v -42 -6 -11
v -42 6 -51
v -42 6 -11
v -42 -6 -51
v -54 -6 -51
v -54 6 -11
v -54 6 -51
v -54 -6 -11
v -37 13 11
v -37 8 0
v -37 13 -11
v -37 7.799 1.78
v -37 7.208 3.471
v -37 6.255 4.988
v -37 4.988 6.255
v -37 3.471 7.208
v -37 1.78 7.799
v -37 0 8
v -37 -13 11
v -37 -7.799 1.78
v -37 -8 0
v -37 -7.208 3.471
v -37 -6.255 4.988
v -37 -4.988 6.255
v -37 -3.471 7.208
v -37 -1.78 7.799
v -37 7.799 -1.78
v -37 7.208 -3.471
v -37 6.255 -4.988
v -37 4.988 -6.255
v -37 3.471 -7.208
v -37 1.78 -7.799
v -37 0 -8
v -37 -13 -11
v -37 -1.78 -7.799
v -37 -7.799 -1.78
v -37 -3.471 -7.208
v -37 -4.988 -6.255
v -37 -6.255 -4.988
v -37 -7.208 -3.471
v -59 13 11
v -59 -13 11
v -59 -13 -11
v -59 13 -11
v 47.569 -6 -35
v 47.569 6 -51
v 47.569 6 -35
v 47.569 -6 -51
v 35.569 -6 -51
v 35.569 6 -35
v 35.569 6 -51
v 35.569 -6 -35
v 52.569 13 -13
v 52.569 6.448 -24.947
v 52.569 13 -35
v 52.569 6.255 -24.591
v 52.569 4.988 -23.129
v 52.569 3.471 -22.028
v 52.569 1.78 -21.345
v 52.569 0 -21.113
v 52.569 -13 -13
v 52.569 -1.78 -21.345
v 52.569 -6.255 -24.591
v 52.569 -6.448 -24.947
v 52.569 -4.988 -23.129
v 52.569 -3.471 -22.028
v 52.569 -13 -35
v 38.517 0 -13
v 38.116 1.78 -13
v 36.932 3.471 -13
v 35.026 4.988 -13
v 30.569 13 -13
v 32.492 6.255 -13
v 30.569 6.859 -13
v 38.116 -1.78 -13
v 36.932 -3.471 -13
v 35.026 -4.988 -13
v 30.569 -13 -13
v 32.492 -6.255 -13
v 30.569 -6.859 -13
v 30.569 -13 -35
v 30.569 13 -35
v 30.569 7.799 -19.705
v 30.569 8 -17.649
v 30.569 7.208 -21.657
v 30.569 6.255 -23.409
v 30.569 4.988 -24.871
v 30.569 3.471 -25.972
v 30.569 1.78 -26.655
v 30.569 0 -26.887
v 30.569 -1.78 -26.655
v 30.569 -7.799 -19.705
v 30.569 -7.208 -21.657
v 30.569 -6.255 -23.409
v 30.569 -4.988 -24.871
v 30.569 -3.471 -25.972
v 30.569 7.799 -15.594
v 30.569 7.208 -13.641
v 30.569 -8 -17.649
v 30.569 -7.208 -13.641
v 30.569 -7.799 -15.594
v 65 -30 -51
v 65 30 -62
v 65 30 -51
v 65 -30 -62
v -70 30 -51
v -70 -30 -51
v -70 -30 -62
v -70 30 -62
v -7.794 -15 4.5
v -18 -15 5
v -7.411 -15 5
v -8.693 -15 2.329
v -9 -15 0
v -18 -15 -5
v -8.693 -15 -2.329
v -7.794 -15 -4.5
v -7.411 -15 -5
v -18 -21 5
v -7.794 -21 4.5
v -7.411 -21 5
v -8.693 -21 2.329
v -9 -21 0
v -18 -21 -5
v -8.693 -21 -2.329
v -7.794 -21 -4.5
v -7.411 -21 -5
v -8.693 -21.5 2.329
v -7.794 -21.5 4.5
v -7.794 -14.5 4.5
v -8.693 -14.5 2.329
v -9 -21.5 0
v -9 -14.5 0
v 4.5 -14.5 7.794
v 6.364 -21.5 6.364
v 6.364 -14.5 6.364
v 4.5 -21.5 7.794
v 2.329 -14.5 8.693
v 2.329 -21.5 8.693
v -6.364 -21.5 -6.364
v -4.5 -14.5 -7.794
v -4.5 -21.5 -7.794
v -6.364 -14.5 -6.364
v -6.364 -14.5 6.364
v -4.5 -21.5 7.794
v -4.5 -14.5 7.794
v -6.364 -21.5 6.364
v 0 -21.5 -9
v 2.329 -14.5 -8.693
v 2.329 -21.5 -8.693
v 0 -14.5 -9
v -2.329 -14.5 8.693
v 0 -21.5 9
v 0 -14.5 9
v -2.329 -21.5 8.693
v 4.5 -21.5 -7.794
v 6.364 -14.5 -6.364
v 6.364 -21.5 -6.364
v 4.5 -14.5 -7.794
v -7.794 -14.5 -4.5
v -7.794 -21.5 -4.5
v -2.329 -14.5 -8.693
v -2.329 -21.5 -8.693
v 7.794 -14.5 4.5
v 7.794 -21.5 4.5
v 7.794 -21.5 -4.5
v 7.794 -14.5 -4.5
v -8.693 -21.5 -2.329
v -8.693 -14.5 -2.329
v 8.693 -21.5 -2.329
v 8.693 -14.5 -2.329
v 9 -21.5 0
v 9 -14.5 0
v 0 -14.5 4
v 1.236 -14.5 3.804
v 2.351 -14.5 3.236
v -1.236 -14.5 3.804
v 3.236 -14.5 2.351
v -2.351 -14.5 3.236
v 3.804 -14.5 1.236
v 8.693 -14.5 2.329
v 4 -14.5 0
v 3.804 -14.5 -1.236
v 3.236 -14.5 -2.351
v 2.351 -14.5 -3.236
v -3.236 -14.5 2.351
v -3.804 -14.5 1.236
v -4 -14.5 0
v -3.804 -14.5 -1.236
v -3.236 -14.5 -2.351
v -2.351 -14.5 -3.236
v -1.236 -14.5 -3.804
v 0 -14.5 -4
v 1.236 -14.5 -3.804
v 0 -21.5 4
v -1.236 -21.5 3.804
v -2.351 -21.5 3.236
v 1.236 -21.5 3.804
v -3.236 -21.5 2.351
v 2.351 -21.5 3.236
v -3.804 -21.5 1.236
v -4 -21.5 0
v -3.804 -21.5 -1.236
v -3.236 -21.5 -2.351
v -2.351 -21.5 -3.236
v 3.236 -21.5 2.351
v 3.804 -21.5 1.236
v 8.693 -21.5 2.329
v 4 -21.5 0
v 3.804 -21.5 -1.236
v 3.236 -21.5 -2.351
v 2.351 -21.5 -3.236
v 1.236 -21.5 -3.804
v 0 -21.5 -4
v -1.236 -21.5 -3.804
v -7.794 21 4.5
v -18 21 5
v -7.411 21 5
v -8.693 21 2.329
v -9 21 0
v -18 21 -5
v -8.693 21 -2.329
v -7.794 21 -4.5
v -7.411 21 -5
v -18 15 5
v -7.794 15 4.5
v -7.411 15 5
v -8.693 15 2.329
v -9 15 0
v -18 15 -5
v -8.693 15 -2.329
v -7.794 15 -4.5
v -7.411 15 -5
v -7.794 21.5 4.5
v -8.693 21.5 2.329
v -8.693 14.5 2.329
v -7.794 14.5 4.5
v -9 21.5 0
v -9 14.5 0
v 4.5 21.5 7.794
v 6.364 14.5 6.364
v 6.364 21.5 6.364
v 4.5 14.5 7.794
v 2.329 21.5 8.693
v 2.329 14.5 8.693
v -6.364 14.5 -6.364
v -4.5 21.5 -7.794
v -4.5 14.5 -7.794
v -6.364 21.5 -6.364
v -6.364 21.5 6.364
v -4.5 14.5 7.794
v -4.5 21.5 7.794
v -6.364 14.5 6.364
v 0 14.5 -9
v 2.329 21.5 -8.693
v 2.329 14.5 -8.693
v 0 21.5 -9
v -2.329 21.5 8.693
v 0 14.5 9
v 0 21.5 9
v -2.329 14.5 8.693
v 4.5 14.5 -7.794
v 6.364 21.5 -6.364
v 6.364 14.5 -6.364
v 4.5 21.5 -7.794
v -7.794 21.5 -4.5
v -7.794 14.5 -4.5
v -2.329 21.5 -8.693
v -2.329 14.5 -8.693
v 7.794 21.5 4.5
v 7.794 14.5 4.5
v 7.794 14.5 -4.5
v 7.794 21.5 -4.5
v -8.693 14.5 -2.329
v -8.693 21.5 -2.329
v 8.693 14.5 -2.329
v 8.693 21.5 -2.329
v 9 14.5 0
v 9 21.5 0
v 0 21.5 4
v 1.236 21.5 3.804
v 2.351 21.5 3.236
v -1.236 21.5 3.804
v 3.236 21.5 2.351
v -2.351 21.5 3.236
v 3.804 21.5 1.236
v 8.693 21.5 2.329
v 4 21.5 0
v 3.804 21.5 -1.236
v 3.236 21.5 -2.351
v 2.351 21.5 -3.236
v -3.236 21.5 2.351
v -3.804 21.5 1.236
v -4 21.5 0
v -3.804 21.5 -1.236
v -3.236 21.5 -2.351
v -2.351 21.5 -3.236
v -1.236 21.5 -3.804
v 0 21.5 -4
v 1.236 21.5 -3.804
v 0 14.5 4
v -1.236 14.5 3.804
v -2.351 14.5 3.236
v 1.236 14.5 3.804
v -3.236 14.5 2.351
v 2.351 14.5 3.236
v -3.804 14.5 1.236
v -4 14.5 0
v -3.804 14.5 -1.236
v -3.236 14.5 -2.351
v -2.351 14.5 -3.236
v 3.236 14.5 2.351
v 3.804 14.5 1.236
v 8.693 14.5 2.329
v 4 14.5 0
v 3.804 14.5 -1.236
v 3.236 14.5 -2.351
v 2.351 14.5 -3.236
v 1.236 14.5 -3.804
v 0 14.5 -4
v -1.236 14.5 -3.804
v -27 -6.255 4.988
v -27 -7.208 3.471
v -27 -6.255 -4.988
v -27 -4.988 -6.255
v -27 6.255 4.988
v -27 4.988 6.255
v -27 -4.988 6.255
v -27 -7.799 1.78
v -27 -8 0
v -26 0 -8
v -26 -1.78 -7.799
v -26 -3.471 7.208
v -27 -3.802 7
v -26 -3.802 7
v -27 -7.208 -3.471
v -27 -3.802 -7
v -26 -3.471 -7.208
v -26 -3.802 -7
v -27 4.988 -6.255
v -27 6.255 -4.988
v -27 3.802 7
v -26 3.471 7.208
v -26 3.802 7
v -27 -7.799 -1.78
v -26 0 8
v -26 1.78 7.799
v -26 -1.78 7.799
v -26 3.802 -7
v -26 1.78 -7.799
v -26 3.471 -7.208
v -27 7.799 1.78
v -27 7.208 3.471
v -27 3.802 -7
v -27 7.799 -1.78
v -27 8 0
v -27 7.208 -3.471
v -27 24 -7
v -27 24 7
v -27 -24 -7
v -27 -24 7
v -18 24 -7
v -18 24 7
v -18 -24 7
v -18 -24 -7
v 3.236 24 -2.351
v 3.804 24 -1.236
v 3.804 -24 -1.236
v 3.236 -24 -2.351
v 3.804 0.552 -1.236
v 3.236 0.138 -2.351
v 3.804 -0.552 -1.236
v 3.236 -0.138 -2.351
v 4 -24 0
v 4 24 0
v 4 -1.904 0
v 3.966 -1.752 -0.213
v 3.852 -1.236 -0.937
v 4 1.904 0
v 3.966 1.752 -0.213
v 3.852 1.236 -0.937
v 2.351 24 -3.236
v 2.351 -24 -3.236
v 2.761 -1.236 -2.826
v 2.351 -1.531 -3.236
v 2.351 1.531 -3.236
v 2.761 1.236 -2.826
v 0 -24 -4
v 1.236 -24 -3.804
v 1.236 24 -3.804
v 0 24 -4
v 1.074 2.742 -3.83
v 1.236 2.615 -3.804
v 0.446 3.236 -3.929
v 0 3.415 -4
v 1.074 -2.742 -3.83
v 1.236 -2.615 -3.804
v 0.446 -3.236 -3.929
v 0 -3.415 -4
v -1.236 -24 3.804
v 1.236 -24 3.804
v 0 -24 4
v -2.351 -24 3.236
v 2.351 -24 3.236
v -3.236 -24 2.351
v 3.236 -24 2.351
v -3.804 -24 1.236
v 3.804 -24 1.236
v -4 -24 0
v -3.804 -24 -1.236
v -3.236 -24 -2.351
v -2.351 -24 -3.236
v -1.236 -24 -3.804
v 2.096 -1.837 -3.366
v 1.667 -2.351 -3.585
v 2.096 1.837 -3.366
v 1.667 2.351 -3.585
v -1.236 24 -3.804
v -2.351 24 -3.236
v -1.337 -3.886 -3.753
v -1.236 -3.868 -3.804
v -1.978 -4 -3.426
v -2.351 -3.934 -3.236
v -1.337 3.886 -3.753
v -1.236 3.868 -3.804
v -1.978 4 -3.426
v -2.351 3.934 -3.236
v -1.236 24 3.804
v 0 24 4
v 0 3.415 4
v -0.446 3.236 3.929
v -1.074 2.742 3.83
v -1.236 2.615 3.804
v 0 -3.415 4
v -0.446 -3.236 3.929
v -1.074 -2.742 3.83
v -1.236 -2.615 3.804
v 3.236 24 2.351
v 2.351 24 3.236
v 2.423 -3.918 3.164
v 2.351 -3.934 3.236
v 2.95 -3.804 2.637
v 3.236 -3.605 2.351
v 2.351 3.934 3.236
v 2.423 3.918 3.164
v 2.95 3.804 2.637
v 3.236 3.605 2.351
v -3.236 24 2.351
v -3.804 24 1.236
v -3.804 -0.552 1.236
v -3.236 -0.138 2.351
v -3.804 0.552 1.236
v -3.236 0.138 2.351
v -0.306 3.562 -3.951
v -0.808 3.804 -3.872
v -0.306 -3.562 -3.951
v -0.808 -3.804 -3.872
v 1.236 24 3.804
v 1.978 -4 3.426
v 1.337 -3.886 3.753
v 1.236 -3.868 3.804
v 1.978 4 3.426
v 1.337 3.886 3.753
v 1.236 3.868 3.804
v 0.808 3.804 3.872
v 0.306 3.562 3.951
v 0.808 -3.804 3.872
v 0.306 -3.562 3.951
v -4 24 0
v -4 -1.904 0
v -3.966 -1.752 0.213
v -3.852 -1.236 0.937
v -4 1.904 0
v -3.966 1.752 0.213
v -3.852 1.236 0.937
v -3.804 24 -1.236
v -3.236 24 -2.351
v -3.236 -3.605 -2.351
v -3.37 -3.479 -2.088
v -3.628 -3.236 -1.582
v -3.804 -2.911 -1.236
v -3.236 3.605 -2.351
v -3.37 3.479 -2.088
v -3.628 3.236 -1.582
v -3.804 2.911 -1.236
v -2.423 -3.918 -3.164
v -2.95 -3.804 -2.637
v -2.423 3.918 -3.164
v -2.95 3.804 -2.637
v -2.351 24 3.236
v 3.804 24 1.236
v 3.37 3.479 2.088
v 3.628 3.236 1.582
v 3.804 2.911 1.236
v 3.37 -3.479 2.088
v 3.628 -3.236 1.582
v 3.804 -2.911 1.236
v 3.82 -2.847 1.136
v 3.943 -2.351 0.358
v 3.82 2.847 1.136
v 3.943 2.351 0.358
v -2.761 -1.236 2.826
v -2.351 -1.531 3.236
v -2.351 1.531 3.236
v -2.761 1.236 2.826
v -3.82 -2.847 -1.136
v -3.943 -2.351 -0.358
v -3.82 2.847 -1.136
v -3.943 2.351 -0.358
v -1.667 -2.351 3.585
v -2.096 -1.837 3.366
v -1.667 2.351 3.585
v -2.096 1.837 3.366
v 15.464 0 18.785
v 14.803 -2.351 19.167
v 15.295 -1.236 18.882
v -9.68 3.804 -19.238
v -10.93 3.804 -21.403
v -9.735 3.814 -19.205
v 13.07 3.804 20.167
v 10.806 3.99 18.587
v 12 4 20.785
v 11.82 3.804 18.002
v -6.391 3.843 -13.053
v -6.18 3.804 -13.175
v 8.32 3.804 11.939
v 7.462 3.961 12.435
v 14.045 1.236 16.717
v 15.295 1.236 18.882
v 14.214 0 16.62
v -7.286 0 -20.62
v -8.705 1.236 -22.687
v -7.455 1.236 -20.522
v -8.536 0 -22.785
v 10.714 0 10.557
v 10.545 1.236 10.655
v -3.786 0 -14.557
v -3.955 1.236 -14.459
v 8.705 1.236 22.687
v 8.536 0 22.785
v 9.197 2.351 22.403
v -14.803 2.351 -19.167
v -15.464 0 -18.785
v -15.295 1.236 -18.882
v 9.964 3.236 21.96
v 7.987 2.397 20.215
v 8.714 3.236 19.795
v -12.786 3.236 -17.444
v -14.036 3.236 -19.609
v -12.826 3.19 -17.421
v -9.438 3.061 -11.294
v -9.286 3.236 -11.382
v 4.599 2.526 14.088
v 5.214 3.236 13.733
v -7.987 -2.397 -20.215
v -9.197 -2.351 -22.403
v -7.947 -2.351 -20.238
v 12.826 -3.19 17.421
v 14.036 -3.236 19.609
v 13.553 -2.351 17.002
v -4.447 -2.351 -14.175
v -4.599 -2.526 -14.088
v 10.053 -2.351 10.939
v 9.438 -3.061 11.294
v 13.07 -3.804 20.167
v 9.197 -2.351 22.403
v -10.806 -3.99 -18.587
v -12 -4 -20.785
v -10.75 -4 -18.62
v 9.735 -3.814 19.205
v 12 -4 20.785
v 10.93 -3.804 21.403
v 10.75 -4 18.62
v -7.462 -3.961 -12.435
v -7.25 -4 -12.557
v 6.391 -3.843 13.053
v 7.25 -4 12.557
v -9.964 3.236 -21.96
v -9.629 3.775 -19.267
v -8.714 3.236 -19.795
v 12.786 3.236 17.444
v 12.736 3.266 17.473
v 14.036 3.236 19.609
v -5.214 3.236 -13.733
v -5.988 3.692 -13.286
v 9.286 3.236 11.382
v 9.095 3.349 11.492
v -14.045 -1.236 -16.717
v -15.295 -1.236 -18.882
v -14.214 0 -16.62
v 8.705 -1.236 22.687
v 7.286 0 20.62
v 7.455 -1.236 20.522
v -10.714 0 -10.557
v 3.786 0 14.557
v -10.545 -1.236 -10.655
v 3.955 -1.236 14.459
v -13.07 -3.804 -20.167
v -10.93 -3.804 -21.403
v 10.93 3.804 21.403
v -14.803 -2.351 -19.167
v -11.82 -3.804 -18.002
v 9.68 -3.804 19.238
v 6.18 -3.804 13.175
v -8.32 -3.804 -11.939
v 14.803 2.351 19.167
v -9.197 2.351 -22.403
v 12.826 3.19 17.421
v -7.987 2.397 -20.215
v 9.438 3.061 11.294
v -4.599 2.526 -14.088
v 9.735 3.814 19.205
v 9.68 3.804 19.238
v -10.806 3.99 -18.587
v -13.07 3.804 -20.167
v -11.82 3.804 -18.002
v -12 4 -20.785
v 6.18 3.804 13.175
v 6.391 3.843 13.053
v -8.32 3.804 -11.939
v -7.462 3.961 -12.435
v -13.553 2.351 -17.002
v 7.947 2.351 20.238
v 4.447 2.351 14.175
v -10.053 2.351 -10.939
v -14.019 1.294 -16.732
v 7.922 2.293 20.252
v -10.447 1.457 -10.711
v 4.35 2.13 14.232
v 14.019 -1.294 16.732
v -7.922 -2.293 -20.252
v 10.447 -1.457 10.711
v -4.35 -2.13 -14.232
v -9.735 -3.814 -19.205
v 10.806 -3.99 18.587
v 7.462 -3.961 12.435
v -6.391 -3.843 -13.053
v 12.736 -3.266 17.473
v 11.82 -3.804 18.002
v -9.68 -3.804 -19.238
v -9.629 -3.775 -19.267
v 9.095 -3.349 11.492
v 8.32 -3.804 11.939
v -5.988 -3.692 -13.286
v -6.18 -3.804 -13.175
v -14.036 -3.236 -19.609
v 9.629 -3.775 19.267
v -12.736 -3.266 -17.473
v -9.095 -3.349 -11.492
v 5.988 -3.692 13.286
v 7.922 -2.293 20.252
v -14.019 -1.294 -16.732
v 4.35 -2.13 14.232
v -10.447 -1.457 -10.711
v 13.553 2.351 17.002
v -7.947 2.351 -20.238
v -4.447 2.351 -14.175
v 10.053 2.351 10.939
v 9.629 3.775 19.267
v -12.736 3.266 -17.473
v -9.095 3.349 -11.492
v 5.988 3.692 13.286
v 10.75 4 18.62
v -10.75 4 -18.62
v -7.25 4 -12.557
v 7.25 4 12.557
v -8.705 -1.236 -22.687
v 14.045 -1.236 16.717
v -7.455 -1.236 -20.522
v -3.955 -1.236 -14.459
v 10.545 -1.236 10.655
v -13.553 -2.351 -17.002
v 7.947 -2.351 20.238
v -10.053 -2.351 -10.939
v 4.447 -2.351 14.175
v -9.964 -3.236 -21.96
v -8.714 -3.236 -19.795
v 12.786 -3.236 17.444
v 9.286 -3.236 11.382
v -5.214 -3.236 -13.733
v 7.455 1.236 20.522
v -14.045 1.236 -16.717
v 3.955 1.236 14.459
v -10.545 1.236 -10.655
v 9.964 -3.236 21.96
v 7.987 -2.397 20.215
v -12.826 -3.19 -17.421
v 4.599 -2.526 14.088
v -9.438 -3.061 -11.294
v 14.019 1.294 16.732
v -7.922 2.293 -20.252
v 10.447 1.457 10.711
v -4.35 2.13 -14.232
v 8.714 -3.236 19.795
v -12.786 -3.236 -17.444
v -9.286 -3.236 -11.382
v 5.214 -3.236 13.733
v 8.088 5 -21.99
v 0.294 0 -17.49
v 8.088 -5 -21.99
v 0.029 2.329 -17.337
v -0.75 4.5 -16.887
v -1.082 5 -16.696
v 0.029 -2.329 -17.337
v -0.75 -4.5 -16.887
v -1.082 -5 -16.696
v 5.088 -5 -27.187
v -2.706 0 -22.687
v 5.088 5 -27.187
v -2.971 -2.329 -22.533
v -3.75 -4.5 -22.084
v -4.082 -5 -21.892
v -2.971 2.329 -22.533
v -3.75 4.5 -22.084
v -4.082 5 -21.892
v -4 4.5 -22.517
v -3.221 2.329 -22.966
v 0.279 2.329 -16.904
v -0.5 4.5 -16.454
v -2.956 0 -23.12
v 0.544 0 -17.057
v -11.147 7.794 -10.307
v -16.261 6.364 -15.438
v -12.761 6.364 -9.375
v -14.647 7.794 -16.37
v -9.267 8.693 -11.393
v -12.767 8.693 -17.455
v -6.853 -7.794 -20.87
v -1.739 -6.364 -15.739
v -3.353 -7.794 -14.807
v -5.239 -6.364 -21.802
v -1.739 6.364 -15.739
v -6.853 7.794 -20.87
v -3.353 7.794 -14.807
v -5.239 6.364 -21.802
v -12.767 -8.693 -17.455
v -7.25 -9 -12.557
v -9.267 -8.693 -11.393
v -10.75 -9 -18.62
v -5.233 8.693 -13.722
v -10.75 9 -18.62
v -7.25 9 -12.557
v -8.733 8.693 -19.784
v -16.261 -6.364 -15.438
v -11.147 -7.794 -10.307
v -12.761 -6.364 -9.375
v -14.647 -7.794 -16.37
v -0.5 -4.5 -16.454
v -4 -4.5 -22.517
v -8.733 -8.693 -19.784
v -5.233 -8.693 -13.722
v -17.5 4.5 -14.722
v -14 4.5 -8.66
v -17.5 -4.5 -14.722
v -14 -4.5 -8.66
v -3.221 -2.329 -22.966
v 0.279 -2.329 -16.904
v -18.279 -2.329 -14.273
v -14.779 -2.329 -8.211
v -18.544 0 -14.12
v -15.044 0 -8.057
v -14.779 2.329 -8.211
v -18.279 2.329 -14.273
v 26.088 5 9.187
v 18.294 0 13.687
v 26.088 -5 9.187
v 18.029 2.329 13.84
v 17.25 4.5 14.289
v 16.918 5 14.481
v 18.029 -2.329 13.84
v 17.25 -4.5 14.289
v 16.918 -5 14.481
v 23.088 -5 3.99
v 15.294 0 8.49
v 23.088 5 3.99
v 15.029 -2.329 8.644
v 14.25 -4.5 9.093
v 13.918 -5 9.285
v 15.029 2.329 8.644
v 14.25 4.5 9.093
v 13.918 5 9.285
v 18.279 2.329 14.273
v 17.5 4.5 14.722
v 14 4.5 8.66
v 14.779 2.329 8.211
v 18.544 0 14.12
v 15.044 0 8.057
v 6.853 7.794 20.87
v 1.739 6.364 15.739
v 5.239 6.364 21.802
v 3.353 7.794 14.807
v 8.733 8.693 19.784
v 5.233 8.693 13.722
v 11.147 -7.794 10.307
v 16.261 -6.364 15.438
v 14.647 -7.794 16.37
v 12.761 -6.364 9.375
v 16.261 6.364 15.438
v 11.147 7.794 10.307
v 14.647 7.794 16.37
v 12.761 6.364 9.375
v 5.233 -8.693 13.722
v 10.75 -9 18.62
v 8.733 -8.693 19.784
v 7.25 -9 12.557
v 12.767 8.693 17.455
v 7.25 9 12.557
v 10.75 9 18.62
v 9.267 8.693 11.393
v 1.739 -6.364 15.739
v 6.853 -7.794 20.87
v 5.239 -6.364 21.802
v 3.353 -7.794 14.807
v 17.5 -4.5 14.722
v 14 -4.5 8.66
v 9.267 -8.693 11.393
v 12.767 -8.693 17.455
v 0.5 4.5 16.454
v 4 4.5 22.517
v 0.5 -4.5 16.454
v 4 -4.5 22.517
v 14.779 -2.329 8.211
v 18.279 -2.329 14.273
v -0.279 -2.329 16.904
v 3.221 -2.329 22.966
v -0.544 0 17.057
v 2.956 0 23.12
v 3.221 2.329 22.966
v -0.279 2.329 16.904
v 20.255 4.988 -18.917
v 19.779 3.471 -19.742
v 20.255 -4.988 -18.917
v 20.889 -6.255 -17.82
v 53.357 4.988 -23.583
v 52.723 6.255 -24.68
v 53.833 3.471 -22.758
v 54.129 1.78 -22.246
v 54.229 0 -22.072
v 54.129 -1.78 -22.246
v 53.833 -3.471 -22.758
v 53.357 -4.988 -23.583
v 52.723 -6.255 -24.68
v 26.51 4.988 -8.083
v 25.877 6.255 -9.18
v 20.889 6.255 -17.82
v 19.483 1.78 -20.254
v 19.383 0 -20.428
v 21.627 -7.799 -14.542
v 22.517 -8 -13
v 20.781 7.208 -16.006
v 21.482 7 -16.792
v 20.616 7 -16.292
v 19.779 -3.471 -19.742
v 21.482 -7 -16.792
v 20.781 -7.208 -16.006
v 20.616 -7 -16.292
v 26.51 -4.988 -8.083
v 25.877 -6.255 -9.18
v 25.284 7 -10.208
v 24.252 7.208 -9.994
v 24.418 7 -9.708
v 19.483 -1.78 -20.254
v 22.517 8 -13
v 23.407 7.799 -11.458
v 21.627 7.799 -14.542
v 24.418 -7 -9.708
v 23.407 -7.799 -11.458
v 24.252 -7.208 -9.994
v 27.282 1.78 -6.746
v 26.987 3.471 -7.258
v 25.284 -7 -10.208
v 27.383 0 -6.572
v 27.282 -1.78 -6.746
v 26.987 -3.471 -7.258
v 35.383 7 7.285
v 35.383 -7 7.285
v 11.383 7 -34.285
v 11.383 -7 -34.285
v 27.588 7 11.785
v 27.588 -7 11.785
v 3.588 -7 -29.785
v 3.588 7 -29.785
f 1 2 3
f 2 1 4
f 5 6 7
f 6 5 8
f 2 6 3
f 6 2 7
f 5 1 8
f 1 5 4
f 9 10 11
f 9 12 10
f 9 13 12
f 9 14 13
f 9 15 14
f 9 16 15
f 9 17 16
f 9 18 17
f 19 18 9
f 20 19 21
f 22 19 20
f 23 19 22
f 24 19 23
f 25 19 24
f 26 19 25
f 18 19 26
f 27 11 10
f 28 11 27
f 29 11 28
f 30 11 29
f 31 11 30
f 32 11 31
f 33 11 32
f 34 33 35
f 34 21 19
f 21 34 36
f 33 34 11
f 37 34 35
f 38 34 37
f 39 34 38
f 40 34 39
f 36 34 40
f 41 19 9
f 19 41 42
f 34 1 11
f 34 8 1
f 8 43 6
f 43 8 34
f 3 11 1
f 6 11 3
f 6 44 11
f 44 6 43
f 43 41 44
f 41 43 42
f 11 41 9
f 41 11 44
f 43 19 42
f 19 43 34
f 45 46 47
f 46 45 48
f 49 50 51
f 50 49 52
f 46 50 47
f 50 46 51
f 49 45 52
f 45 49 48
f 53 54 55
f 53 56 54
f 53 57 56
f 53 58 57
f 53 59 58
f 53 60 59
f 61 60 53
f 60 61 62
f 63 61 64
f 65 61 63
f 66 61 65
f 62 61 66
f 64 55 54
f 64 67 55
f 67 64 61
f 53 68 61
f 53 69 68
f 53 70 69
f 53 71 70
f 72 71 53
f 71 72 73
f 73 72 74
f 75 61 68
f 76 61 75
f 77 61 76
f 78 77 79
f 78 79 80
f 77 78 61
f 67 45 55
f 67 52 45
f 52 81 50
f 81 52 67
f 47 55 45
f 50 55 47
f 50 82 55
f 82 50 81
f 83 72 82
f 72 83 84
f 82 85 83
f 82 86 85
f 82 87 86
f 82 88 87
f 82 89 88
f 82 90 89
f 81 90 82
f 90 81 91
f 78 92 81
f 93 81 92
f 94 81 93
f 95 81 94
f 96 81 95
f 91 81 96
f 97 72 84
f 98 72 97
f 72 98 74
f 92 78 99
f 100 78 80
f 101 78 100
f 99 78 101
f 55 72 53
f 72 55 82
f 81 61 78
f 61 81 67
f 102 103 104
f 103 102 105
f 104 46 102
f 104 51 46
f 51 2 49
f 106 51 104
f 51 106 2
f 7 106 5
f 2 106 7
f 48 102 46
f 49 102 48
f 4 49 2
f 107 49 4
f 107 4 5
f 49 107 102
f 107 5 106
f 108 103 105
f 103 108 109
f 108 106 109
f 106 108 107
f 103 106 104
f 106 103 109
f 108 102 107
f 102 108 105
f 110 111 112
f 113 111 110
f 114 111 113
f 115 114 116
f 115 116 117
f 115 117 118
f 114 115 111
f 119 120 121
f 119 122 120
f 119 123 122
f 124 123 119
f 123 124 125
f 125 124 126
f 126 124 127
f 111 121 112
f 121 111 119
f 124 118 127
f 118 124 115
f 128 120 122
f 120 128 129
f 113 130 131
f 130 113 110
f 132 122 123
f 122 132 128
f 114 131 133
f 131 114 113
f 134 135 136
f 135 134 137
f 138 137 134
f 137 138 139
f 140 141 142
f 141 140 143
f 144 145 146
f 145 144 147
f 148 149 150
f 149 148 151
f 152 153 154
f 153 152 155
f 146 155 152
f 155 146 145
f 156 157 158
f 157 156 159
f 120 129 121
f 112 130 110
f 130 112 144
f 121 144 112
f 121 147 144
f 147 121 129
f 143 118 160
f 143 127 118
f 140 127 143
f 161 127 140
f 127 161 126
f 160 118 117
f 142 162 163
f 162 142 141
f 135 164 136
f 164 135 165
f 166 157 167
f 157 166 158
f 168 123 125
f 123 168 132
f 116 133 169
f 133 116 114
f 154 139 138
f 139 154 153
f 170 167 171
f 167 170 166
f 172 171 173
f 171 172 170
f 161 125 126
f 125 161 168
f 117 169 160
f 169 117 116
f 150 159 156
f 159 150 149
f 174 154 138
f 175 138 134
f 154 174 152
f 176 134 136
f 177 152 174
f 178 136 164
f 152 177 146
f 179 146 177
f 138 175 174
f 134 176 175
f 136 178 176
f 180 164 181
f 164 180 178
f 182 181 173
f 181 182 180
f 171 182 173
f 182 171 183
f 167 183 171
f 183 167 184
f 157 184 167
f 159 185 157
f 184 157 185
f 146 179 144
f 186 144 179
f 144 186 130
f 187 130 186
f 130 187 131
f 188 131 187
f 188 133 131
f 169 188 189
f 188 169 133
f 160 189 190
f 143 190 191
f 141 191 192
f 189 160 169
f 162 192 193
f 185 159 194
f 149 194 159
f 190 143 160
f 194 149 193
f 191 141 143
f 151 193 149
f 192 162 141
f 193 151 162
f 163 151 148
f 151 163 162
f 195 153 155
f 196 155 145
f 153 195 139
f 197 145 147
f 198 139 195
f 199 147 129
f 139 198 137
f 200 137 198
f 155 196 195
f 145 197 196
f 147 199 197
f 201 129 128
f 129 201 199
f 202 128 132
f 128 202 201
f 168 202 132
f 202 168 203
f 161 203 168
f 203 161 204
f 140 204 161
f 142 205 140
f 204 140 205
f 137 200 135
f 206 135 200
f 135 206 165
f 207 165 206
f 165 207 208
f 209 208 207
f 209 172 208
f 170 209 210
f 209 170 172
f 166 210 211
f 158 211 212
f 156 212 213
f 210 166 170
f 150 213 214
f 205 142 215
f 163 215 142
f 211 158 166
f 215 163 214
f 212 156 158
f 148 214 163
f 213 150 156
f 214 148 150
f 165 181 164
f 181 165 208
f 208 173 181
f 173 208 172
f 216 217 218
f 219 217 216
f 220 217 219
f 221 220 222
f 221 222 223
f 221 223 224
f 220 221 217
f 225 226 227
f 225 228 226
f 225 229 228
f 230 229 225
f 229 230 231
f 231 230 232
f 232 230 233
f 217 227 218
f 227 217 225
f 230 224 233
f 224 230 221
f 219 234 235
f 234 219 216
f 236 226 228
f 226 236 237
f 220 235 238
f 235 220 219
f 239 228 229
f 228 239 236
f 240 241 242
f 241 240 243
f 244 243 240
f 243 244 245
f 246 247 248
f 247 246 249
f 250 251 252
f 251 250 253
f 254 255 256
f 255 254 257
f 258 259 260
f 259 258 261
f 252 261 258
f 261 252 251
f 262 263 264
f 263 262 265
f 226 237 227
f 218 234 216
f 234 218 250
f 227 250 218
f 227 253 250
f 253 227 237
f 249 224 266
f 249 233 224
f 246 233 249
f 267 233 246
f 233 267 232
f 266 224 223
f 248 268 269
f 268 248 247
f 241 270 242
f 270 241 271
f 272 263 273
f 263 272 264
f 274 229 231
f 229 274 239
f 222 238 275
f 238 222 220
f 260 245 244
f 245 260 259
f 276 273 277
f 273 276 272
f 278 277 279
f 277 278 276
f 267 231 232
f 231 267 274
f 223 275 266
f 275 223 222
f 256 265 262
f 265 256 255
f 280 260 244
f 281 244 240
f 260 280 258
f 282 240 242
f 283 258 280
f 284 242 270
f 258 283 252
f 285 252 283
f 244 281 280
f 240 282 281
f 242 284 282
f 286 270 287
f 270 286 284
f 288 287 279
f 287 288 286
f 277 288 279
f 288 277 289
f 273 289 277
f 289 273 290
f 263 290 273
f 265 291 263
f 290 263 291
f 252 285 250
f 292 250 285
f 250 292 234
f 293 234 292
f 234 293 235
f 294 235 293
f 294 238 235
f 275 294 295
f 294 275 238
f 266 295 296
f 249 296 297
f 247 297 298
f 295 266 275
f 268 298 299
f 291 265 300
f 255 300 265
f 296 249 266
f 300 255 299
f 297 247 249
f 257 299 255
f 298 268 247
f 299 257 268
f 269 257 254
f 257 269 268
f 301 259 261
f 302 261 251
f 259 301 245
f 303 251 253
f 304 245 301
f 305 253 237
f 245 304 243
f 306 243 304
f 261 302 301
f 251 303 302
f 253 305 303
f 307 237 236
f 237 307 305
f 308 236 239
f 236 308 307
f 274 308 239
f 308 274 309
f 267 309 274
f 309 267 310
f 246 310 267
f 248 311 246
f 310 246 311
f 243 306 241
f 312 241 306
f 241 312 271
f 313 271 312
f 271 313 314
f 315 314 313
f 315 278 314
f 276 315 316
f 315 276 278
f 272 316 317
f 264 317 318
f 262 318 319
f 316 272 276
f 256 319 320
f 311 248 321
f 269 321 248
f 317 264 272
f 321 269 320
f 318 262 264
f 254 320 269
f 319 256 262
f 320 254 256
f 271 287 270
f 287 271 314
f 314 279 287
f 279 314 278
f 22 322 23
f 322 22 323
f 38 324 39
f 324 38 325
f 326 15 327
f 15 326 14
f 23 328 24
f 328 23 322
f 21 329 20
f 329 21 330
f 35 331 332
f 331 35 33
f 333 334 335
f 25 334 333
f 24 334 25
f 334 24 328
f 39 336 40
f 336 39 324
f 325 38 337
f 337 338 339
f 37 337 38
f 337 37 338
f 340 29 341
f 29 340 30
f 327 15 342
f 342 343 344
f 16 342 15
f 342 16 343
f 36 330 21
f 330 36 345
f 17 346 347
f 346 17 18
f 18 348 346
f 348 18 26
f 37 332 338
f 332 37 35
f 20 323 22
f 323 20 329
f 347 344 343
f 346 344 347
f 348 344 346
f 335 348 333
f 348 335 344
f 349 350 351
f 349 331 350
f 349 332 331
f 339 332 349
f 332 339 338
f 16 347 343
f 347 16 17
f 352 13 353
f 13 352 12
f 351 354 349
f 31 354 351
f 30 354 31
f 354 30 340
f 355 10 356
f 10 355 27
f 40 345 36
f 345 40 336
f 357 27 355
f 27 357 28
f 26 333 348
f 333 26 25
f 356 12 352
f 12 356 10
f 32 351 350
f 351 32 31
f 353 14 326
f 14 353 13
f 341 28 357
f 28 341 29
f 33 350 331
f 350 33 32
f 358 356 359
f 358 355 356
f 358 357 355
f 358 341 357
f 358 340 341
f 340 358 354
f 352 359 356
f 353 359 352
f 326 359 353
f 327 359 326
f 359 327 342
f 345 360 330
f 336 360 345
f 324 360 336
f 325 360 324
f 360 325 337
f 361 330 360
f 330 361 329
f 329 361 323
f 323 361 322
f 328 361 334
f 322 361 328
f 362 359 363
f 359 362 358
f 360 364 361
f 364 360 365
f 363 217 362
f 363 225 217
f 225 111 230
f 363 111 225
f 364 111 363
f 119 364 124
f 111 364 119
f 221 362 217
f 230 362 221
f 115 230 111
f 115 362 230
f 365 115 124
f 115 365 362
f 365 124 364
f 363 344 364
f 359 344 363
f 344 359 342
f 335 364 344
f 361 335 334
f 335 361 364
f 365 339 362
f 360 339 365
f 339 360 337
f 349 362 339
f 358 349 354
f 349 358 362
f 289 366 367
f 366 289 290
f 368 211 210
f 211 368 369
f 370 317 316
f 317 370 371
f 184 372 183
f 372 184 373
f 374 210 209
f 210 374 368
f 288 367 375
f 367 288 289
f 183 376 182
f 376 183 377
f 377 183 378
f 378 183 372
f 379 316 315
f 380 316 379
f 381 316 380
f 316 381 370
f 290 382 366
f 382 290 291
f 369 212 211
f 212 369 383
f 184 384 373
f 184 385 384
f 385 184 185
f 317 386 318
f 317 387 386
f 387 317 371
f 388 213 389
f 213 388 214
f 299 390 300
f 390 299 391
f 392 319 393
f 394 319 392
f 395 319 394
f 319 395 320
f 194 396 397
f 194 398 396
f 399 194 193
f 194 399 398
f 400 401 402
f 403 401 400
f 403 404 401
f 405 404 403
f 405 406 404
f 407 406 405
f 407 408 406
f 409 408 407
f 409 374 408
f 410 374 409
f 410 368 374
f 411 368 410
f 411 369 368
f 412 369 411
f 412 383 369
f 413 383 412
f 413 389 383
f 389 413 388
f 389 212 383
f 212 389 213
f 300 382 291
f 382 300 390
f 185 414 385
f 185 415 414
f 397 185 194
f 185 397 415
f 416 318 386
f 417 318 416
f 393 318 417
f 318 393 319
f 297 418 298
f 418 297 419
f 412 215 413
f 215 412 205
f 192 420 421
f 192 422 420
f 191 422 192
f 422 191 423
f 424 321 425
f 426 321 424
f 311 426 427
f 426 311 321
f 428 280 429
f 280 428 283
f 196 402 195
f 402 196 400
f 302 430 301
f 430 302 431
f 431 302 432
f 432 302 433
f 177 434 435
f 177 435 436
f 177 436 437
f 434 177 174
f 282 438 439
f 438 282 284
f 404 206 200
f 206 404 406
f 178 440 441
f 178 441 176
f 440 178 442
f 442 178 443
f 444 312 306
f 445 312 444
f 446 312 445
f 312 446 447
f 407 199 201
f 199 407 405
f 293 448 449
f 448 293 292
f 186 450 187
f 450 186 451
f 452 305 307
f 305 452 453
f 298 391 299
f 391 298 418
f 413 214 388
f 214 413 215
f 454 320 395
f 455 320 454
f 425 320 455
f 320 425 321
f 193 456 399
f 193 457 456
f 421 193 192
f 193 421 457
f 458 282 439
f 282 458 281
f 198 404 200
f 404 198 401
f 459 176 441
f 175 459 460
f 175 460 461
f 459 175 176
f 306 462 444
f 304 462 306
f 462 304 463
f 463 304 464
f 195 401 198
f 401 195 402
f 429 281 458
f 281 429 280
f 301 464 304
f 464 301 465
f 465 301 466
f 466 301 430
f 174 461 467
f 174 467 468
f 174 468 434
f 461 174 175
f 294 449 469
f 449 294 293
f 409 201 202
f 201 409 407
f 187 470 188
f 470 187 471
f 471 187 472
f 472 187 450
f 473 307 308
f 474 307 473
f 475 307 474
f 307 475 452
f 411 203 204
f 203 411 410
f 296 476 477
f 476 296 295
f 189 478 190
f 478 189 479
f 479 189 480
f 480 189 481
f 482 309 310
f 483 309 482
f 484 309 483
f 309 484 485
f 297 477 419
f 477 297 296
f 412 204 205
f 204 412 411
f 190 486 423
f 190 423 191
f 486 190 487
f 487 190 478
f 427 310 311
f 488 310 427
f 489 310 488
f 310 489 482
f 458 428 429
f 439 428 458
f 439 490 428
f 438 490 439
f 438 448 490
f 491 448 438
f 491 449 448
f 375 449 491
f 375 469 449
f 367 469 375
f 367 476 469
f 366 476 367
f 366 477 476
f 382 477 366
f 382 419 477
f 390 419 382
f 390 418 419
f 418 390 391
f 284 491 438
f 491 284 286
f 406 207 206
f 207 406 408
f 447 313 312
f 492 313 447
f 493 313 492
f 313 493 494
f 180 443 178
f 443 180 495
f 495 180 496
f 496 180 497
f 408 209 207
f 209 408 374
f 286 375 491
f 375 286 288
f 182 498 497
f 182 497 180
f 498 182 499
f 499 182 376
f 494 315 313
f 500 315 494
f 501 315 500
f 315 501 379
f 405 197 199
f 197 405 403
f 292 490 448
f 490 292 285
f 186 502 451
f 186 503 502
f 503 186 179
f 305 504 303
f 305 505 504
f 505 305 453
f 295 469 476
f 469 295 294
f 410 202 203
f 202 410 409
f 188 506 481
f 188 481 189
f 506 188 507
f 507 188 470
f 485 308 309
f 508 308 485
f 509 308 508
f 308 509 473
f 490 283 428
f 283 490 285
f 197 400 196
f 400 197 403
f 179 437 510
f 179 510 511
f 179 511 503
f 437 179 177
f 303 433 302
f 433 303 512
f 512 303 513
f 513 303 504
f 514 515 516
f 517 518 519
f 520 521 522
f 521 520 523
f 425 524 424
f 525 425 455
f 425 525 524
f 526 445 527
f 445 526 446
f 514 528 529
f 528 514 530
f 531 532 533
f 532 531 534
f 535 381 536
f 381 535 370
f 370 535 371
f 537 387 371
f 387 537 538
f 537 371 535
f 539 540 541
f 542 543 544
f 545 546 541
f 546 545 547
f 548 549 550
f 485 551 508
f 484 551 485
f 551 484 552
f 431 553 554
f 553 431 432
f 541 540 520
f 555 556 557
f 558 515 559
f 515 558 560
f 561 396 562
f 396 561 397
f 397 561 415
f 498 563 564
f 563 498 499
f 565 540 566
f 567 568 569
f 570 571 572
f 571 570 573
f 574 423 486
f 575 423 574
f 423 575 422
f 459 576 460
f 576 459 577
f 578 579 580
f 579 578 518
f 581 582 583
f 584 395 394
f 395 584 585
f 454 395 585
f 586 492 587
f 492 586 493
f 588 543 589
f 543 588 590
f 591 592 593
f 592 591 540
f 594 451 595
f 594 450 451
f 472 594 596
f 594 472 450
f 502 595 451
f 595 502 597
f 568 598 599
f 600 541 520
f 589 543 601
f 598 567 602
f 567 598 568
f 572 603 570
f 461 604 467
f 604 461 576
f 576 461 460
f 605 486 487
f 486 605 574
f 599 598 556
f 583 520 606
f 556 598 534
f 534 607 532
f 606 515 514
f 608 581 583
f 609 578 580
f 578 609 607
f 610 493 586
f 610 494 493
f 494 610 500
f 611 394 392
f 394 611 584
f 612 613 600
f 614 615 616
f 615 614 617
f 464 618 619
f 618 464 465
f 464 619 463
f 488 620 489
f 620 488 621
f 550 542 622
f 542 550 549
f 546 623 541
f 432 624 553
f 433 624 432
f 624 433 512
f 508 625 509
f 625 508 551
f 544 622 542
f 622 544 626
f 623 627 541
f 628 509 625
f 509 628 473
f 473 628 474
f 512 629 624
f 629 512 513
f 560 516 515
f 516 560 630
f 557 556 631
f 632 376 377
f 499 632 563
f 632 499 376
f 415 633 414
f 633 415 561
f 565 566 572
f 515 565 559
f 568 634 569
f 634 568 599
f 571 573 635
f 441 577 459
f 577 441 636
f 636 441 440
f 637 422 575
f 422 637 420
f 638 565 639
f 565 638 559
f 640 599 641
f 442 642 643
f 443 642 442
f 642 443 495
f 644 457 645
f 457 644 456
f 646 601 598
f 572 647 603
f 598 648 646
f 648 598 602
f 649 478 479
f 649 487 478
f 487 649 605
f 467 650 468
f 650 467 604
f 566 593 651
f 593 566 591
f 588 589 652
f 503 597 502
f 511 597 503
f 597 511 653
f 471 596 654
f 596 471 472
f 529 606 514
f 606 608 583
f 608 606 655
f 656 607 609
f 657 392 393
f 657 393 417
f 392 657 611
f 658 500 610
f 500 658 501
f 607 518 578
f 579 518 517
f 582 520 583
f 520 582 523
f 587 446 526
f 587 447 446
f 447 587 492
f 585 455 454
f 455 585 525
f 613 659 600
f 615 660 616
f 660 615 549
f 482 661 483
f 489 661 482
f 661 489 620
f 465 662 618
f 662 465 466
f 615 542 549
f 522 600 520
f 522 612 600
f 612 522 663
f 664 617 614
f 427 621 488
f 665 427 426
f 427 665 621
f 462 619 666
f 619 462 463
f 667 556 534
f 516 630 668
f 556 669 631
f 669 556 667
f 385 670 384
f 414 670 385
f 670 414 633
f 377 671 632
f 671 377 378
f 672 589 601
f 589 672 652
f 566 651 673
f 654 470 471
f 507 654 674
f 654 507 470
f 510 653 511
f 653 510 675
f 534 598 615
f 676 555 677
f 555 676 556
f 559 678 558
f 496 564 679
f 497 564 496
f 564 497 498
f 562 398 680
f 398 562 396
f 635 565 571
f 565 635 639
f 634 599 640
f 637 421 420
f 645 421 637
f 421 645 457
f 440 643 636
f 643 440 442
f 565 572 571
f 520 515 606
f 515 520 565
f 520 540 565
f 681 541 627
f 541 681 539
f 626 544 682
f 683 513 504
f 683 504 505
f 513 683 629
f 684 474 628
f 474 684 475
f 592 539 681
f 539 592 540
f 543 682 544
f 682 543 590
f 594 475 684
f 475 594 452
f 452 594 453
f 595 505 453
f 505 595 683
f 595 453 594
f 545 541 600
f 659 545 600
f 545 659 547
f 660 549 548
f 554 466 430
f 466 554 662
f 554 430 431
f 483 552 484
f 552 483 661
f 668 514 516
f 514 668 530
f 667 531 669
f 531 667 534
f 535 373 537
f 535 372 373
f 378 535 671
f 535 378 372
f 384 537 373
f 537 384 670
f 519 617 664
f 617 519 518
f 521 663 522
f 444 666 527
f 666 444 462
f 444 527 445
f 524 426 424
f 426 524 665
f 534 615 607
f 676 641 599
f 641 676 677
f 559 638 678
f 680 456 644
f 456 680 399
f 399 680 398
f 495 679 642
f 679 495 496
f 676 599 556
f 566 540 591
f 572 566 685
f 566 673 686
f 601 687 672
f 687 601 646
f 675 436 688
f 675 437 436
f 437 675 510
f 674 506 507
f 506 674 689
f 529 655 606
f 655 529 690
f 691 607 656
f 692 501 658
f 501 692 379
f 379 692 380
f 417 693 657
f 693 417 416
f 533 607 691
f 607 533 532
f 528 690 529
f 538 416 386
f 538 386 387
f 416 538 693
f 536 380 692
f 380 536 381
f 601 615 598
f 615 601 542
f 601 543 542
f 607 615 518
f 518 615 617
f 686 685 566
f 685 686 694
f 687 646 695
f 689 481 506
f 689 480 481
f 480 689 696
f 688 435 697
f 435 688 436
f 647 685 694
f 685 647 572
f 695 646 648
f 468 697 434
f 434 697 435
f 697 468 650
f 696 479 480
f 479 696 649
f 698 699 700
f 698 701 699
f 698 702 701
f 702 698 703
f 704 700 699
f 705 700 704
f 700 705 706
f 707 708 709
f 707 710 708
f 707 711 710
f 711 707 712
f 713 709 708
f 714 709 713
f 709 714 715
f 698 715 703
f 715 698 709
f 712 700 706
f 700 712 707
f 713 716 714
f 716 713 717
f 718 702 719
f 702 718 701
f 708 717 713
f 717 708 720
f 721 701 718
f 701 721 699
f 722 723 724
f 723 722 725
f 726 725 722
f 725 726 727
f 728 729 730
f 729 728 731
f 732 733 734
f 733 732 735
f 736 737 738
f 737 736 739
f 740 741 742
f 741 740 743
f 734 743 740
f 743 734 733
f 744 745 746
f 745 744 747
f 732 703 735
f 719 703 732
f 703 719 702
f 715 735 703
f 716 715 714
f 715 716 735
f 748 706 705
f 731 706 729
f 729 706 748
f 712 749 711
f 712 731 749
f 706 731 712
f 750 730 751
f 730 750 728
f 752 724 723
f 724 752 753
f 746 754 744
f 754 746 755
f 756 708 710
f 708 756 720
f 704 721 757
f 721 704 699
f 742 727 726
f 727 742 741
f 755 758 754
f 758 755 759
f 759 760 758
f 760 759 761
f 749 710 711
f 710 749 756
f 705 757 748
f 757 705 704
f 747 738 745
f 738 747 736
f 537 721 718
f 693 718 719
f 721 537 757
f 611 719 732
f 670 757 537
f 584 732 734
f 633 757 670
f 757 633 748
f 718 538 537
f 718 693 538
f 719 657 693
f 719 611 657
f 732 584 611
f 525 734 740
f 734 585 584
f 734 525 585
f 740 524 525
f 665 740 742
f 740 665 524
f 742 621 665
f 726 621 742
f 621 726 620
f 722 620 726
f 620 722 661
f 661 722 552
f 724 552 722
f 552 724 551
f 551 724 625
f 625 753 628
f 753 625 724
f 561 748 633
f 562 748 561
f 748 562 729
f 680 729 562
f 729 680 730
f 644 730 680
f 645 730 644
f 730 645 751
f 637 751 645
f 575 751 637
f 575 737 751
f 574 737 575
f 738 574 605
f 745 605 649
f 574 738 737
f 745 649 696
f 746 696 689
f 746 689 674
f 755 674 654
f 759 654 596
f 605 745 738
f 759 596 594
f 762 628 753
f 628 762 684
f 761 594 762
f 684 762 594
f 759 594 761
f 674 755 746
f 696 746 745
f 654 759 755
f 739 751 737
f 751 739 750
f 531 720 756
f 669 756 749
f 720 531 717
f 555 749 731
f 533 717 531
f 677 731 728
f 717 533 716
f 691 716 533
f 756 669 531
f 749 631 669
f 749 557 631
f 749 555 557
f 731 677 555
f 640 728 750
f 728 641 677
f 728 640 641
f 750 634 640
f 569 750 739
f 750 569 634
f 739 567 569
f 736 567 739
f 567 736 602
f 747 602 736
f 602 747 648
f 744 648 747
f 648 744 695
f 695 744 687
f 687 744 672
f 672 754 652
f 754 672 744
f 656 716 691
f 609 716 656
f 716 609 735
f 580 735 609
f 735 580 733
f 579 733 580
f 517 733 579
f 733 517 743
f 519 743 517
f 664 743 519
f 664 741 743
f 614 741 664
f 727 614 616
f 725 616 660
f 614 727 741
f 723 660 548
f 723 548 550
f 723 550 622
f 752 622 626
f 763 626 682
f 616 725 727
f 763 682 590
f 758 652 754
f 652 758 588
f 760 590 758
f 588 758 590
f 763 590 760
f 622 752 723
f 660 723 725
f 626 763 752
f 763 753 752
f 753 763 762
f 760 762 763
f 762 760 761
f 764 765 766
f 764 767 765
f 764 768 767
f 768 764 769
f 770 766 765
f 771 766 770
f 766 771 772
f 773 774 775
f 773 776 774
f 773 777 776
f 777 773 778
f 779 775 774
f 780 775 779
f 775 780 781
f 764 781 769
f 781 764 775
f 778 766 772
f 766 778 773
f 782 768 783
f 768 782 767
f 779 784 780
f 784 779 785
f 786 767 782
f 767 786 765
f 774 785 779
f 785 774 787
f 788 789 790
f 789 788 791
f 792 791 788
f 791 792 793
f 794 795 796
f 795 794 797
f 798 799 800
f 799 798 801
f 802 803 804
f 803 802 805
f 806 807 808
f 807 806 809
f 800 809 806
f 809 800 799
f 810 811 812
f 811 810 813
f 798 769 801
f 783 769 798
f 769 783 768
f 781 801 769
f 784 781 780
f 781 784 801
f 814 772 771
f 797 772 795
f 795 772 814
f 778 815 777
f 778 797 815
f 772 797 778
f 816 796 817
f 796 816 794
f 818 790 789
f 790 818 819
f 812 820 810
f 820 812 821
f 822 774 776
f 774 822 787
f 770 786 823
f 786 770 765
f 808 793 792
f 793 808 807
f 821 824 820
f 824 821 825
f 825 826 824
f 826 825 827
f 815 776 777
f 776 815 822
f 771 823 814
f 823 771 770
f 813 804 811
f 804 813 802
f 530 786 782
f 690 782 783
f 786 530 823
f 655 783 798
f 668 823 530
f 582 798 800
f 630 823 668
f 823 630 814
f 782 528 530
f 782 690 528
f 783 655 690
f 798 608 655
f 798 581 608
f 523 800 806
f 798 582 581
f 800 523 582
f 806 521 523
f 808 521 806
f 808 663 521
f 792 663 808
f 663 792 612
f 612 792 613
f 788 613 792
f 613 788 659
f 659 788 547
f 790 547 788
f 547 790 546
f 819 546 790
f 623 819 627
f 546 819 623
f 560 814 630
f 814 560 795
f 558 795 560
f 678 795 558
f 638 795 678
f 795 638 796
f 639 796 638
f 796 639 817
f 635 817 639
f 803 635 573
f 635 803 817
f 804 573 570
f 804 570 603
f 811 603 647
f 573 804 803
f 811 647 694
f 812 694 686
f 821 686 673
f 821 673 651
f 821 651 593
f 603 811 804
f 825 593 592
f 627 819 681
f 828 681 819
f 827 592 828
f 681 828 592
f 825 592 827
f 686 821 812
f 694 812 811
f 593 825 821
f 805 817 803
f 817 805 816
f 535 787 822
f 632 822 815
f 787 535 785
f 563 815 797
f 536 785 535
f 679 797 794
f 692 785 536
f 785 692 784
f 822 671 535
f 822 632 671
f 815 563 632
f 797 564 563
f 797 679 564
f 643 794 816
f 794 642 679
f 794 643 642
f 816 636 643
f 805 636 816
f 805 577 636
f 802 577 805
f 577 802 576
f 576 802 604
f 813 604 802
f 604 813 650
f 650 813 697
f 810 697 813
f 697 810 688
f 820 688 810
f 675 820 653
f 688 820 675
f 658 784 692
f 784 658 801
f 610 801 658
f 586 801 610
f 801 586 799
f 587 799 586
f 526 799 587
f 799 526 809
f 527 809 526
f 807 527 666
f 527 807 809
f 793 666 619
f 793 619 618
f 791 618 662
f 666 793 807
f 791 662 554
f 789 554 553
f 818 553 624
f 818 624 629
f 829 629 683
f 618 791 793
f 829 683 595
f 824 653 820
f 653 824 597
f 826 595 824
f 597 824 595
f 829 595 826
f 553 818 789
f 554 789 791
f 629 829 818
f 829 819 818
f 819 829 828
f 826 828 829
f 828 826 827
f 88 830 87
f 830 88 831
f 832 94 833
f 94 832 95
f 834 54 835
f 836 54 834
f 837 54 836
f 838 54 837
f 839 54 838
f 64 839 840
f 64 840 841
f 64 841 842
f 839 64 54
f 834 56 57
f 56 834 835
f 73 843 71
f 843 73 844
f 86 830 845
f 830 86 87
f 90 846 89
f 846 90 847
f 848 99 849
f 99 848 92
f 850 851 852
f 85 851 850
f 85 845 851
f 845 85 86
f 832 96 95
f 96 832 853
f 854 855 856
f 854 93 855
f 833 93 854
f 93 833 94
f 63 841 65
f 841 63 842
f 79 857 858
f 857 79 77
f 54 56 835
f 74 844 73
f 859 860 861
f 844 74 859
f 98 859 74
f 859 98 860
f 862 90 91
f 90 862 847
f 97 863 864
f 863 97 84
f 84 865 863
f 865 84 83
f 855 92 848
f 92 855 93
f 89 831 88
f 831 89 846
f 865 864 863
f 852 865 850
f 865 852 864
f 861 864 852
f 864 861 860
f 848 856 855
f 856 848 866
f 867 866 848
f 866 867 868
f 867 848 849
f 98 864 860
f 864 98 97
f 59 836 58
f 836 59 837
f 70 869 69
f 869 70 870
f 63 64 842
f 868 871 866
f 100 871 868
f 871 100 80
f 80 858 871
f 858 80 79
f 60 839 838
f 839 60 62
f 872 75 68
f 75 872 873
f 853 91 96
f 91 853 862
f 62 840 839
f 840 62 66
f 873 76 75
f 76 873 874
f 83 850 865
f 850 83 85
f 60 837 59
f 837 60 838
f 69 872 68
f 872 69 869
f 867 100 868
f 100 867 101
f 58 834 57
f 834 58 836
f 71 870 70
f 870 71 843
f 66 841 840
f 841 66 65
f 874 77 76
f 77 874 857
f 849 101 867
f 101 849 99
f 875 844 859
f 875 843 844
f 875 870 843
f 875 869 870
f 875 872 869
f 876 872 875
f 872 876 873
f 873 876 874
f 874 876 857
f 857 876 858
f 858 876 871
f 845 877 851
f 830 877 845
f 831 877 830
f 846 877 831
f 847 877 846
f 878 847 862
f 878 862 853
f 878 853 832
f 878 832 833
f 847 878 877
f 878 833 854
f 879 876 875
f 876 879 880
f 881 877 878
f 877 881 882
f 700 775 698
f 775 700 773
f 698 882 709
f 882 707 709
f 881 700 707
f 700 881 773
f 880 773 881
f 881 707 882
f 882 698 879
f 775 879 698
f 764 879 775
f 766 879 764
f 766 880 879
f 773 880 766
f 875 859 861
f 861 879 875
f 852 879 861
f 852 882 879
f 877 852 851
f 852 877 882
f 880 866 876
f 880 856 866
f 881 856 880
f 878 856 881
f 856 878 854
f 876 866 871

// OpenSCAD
// A Hooke joint: constant in, and emphatically not constant out.
//
// Two shafts at an angle, a cross between them, and a yoke on each shaft holding
// one of the cross's two pins. It is the only mechanism in the tour that is not
// planar — every other closed loop here has all its axes parallel, and this one
// cannot, because the whole point of it is that the two shafts are not.
//
// Turn the input at a constant rate and the output does *not* turn at a constant
// rate. It runs ahead, falls behind, runs ahead and falls behind again, twice per
// revolution, and the relation is exact:
//
//     tan θ_out = cos β · tan θ_in
//
// which makes the output's speed swing between cos β and 1/cos β of the input's.
// At the 30° drawn here that is 0.866 to 1.155 — ±15%, from a joint whose entire
// job is to transmit rotation unchanged. Nobody expects it, every driveshaft has
// it, and the cure is the disease applied twice: a second joint, phased a quarter
// turn against the first and at the same angle, has an error equal and opposite,
// which is why a propshaft has a U-joint at each end rather than one in the
// middle.
//
// Nothing in this file mentions any of that. It is four parts and four joints,
// and the wobble is what the geometry leaves them.
//
// 30° is also about the practical limit, and for a reason you can see: the two
// yokes are always exactly a quarter turn apart — that is what the cross is
// for — and it is their arms passing each other that runs out of room first.
//
// ---------------------------------------------------------------------------
// It is drawn about the origin, and that is not a stylistic choice — it is the
// only model in the tour that has to be.
//
// A spherical four-bar is over-constrained: four hinges, three moving bodies,
// 6·3 − 5·4 = −2 by the spatial count, exactly as the planar four-bar is
// over-constrained at −2. Both move perfectly well, because the extra
// constraints are redundant rather than contradictory. The difference is *what*
// makes them redundant. For the planar loop it is that the axes are parallel,
// which stays true wherever the model is drawn. For this one it is that all four
// axes meet at a single point, and that is a knife edge: miss it and the four
// constraints stop being redundant and start being inconsistent, and the solver
// pulls the loop apart trying to satisfy all of them at once.
//
// Drawn with its centre at [70, 0, 70] this model blew up after 36 frames — and
// more solver substeps made it blow up *sooner*, which is the signature of
// exactly that. It was converging harder onto something that cannot be
// satisfied. The anchors are single precision, so a hundred units out the four
// axes miss each other by something like 1e-5, and that was enough. At the origin
// they meet, and it runs.
//
// Which is worth knowing generally: an over-constrained loop is only as good as
// the arithmetic that makes its constraints redundant.

module part(name, fixed = false, density = undef, mass = undef,
            collider = undef, friction = undef, bounce = undef) { children(); }
module hinge(name, parts, at, axis, range) { }
module drive(name, to, over, at, torque, speed) { }

STEEL = 0.0078;         // g/mm³

BETA  = 30;             // the angle between the shafts
YOKE  = 18;             // half the span between a yoke's two arms
ARM   = 6;              // and how thick an arm is
SH    = 8;              // shaft radius
PR    = 4;              // the cross's pins
REACH = 26;             // how far a yoke's bar stands off the joint centre
BEARING = 48;           // and how far along each shaft its ground bearing sits

BED = -52;              // the top of the bed, well under everything

// The input's pin lies along y — across the plane the two shafts make — and the
// output's lies in that plane. Perpendicular to each other and each
// perpendicular to its own shaft, which is the whole definition of the cross.
IN_AXIS   = [0, 1, 0];
OUT_AXIS  = [sin(BETA), 0, cos(BETA)];
OUT_SHAFT = [cos(BETA), 0, -sin(BETA)];
OUT_AT    = [BEARING * OUT_SHAFT[0], 0, BEARING * OUT_SHAFT[2]];

// ---- one yoke, drawn once --------------------------------------------------
// Canonically: the shaft runs along +x, the pin it holds runs along +z, and the
// joint centre is the origin. Both yokes are this, placed differently — which is
// the only honest way to draw them, since a Hooke joint's two halves *are* the
// same part turned.
//
// No two of its solids share a face. That matters more here than anywhere else
// in the tour: the output's copy is rotated 30°, so what were exact coincidences
// become *near* coincidences in irrational coordinates, which is the worst thing
// an exact kernel can be handed. Butted rather than overlapped, this fork cost
// 844 triangles as the input and 18,942 as the output — 4.4 seconds for one part.
module fork(reach, shaft_len) {
    translate([reach, 0, 0]) rotate([0, 90, 0])
        cylinder(h = shaft_len, r = SH, $fn = 28);
    translate([reach - 8, -7, -YOKE - ARM]) cube([9, 14, 2 * (YOKE + ARM)]);
    for (s = [-1, 1]) {
        translate([-2, -5, s * YOKE - ARM / 2]) cube([reach - 2, 10, ARM]);
        translate([0, 0, s * YOKE - ARM / 2 - 0.5])
            cylinder(h = ARM + 1, r = 9, $fn = 24);
    }
}

// A housing on a pillar, standing on the bed and reaching up to `at`.
module pedestal(at) {
    translate([at[0] - 6, -6, BED - 1]) cube([12, 12, at[2] - BED - 8]);
    translate([at[0] - 11, -13, at[2] - 11]) cube([22, 26, 22]);
}

// ---- the frame -------------------------------------------------------------
// A bed and two housings, one at the far end of each shaft. They are at the ends
// on purpose: the joint itself is the subject, and nothing structural belongs
// between it and the camera, which sits at -y.
part("frame", fixed = true)
    color("slategray") {
        translate([-70, -30, BED - 10]) cube([135, 60, 11]);
        color("dimgray") {
            pedestal([-BEARING, 0, 0]);
            pedestal(OUT_AT);
        }
    }

// ---- the input shaft and its yoke ------------------------------------------
// `rotate([-90, 180, 0])` turns the canonical fork round to face the other way
// and stands its pin along y: the shaft runs back towards -x, and the arms
// straddle the cross at |y| >= 15 while the output's straddle it in the plane at
// right angles. That is how two yokes a quarter turn apart share one centre
// without ever being in the same place.
//
// `collider = "decompose"` is not optional here, and this is the model that
// shows why. A yoke is a *fork*, and a moving part's collider is its convex hull
// by default — which fills the fork's gap back in with the solid it was cut out
// of. Two forks interlocked at right angles both have hulls containing the joint
// centre, so the check reported "input into output by 20.928" before anything had
// moved, and the solver spent the run shoving apart two blobs that in the machine
// never touch. Split into convex pieces, each yoke keeps the gap that lets the
// other one through — at about a voxel of accuracy, which is why the arms are
// given 10 mm of clearance rather than 1.
part("input", density = STEEL, collider = "decompose")
    color("indianred") rotate([-90, 180, 0]) fork(REACH, 32);
hinge("input_bearing", parts = ["input", "frame"],
      at = [-BEARING, 0, 0], axis = [1, 0, 0]);

// ---- the cross -------------------------------------------------------------
// Two pins through one centre, at right angles. It is the smallest part in the
// tour and the only reason the other three can be where they are.
part("cross", density = STEEL)
    color("goldenrod") {
        rotate([-90, 0, 0]) cylinder(h = 48, r = PR, $fn = 20, center = true);
        rotate([0, BETA, 0]) cylinder(h = 48, r = PR, $fn = 20, center = true);
    }
hinge("cross_in", parts = ["cross", "input"], at = [0, 0, 0], axis = IN_AXIS);

// ---- the output shaft and its yoke -----------------------------------------
// The same fork, turned to sit on the other pin: `rotate([0, BETA, 0])` takes x
// to the output shaft's direction and z to the pin's, which is exactly the
// relationship the two have to be in.
part("output", density = STEEL, collider = "decompose")
    color("steelblue") rotate([0, BETA, 0]) fork(REACH, 32);
hinge("cross_out", parts = ["output", "cross"], at = [0, 0, 0], axis = OUT_AXIS);
hinge("output_bearing", parts = ["output", "frame"], at = OUT_AT, axis = OUT_SHAFT);

// One input, turning steadily. Everything after it is what the geometry allows.
drive("input_bearing", speed = 180, torque = 8000000);
